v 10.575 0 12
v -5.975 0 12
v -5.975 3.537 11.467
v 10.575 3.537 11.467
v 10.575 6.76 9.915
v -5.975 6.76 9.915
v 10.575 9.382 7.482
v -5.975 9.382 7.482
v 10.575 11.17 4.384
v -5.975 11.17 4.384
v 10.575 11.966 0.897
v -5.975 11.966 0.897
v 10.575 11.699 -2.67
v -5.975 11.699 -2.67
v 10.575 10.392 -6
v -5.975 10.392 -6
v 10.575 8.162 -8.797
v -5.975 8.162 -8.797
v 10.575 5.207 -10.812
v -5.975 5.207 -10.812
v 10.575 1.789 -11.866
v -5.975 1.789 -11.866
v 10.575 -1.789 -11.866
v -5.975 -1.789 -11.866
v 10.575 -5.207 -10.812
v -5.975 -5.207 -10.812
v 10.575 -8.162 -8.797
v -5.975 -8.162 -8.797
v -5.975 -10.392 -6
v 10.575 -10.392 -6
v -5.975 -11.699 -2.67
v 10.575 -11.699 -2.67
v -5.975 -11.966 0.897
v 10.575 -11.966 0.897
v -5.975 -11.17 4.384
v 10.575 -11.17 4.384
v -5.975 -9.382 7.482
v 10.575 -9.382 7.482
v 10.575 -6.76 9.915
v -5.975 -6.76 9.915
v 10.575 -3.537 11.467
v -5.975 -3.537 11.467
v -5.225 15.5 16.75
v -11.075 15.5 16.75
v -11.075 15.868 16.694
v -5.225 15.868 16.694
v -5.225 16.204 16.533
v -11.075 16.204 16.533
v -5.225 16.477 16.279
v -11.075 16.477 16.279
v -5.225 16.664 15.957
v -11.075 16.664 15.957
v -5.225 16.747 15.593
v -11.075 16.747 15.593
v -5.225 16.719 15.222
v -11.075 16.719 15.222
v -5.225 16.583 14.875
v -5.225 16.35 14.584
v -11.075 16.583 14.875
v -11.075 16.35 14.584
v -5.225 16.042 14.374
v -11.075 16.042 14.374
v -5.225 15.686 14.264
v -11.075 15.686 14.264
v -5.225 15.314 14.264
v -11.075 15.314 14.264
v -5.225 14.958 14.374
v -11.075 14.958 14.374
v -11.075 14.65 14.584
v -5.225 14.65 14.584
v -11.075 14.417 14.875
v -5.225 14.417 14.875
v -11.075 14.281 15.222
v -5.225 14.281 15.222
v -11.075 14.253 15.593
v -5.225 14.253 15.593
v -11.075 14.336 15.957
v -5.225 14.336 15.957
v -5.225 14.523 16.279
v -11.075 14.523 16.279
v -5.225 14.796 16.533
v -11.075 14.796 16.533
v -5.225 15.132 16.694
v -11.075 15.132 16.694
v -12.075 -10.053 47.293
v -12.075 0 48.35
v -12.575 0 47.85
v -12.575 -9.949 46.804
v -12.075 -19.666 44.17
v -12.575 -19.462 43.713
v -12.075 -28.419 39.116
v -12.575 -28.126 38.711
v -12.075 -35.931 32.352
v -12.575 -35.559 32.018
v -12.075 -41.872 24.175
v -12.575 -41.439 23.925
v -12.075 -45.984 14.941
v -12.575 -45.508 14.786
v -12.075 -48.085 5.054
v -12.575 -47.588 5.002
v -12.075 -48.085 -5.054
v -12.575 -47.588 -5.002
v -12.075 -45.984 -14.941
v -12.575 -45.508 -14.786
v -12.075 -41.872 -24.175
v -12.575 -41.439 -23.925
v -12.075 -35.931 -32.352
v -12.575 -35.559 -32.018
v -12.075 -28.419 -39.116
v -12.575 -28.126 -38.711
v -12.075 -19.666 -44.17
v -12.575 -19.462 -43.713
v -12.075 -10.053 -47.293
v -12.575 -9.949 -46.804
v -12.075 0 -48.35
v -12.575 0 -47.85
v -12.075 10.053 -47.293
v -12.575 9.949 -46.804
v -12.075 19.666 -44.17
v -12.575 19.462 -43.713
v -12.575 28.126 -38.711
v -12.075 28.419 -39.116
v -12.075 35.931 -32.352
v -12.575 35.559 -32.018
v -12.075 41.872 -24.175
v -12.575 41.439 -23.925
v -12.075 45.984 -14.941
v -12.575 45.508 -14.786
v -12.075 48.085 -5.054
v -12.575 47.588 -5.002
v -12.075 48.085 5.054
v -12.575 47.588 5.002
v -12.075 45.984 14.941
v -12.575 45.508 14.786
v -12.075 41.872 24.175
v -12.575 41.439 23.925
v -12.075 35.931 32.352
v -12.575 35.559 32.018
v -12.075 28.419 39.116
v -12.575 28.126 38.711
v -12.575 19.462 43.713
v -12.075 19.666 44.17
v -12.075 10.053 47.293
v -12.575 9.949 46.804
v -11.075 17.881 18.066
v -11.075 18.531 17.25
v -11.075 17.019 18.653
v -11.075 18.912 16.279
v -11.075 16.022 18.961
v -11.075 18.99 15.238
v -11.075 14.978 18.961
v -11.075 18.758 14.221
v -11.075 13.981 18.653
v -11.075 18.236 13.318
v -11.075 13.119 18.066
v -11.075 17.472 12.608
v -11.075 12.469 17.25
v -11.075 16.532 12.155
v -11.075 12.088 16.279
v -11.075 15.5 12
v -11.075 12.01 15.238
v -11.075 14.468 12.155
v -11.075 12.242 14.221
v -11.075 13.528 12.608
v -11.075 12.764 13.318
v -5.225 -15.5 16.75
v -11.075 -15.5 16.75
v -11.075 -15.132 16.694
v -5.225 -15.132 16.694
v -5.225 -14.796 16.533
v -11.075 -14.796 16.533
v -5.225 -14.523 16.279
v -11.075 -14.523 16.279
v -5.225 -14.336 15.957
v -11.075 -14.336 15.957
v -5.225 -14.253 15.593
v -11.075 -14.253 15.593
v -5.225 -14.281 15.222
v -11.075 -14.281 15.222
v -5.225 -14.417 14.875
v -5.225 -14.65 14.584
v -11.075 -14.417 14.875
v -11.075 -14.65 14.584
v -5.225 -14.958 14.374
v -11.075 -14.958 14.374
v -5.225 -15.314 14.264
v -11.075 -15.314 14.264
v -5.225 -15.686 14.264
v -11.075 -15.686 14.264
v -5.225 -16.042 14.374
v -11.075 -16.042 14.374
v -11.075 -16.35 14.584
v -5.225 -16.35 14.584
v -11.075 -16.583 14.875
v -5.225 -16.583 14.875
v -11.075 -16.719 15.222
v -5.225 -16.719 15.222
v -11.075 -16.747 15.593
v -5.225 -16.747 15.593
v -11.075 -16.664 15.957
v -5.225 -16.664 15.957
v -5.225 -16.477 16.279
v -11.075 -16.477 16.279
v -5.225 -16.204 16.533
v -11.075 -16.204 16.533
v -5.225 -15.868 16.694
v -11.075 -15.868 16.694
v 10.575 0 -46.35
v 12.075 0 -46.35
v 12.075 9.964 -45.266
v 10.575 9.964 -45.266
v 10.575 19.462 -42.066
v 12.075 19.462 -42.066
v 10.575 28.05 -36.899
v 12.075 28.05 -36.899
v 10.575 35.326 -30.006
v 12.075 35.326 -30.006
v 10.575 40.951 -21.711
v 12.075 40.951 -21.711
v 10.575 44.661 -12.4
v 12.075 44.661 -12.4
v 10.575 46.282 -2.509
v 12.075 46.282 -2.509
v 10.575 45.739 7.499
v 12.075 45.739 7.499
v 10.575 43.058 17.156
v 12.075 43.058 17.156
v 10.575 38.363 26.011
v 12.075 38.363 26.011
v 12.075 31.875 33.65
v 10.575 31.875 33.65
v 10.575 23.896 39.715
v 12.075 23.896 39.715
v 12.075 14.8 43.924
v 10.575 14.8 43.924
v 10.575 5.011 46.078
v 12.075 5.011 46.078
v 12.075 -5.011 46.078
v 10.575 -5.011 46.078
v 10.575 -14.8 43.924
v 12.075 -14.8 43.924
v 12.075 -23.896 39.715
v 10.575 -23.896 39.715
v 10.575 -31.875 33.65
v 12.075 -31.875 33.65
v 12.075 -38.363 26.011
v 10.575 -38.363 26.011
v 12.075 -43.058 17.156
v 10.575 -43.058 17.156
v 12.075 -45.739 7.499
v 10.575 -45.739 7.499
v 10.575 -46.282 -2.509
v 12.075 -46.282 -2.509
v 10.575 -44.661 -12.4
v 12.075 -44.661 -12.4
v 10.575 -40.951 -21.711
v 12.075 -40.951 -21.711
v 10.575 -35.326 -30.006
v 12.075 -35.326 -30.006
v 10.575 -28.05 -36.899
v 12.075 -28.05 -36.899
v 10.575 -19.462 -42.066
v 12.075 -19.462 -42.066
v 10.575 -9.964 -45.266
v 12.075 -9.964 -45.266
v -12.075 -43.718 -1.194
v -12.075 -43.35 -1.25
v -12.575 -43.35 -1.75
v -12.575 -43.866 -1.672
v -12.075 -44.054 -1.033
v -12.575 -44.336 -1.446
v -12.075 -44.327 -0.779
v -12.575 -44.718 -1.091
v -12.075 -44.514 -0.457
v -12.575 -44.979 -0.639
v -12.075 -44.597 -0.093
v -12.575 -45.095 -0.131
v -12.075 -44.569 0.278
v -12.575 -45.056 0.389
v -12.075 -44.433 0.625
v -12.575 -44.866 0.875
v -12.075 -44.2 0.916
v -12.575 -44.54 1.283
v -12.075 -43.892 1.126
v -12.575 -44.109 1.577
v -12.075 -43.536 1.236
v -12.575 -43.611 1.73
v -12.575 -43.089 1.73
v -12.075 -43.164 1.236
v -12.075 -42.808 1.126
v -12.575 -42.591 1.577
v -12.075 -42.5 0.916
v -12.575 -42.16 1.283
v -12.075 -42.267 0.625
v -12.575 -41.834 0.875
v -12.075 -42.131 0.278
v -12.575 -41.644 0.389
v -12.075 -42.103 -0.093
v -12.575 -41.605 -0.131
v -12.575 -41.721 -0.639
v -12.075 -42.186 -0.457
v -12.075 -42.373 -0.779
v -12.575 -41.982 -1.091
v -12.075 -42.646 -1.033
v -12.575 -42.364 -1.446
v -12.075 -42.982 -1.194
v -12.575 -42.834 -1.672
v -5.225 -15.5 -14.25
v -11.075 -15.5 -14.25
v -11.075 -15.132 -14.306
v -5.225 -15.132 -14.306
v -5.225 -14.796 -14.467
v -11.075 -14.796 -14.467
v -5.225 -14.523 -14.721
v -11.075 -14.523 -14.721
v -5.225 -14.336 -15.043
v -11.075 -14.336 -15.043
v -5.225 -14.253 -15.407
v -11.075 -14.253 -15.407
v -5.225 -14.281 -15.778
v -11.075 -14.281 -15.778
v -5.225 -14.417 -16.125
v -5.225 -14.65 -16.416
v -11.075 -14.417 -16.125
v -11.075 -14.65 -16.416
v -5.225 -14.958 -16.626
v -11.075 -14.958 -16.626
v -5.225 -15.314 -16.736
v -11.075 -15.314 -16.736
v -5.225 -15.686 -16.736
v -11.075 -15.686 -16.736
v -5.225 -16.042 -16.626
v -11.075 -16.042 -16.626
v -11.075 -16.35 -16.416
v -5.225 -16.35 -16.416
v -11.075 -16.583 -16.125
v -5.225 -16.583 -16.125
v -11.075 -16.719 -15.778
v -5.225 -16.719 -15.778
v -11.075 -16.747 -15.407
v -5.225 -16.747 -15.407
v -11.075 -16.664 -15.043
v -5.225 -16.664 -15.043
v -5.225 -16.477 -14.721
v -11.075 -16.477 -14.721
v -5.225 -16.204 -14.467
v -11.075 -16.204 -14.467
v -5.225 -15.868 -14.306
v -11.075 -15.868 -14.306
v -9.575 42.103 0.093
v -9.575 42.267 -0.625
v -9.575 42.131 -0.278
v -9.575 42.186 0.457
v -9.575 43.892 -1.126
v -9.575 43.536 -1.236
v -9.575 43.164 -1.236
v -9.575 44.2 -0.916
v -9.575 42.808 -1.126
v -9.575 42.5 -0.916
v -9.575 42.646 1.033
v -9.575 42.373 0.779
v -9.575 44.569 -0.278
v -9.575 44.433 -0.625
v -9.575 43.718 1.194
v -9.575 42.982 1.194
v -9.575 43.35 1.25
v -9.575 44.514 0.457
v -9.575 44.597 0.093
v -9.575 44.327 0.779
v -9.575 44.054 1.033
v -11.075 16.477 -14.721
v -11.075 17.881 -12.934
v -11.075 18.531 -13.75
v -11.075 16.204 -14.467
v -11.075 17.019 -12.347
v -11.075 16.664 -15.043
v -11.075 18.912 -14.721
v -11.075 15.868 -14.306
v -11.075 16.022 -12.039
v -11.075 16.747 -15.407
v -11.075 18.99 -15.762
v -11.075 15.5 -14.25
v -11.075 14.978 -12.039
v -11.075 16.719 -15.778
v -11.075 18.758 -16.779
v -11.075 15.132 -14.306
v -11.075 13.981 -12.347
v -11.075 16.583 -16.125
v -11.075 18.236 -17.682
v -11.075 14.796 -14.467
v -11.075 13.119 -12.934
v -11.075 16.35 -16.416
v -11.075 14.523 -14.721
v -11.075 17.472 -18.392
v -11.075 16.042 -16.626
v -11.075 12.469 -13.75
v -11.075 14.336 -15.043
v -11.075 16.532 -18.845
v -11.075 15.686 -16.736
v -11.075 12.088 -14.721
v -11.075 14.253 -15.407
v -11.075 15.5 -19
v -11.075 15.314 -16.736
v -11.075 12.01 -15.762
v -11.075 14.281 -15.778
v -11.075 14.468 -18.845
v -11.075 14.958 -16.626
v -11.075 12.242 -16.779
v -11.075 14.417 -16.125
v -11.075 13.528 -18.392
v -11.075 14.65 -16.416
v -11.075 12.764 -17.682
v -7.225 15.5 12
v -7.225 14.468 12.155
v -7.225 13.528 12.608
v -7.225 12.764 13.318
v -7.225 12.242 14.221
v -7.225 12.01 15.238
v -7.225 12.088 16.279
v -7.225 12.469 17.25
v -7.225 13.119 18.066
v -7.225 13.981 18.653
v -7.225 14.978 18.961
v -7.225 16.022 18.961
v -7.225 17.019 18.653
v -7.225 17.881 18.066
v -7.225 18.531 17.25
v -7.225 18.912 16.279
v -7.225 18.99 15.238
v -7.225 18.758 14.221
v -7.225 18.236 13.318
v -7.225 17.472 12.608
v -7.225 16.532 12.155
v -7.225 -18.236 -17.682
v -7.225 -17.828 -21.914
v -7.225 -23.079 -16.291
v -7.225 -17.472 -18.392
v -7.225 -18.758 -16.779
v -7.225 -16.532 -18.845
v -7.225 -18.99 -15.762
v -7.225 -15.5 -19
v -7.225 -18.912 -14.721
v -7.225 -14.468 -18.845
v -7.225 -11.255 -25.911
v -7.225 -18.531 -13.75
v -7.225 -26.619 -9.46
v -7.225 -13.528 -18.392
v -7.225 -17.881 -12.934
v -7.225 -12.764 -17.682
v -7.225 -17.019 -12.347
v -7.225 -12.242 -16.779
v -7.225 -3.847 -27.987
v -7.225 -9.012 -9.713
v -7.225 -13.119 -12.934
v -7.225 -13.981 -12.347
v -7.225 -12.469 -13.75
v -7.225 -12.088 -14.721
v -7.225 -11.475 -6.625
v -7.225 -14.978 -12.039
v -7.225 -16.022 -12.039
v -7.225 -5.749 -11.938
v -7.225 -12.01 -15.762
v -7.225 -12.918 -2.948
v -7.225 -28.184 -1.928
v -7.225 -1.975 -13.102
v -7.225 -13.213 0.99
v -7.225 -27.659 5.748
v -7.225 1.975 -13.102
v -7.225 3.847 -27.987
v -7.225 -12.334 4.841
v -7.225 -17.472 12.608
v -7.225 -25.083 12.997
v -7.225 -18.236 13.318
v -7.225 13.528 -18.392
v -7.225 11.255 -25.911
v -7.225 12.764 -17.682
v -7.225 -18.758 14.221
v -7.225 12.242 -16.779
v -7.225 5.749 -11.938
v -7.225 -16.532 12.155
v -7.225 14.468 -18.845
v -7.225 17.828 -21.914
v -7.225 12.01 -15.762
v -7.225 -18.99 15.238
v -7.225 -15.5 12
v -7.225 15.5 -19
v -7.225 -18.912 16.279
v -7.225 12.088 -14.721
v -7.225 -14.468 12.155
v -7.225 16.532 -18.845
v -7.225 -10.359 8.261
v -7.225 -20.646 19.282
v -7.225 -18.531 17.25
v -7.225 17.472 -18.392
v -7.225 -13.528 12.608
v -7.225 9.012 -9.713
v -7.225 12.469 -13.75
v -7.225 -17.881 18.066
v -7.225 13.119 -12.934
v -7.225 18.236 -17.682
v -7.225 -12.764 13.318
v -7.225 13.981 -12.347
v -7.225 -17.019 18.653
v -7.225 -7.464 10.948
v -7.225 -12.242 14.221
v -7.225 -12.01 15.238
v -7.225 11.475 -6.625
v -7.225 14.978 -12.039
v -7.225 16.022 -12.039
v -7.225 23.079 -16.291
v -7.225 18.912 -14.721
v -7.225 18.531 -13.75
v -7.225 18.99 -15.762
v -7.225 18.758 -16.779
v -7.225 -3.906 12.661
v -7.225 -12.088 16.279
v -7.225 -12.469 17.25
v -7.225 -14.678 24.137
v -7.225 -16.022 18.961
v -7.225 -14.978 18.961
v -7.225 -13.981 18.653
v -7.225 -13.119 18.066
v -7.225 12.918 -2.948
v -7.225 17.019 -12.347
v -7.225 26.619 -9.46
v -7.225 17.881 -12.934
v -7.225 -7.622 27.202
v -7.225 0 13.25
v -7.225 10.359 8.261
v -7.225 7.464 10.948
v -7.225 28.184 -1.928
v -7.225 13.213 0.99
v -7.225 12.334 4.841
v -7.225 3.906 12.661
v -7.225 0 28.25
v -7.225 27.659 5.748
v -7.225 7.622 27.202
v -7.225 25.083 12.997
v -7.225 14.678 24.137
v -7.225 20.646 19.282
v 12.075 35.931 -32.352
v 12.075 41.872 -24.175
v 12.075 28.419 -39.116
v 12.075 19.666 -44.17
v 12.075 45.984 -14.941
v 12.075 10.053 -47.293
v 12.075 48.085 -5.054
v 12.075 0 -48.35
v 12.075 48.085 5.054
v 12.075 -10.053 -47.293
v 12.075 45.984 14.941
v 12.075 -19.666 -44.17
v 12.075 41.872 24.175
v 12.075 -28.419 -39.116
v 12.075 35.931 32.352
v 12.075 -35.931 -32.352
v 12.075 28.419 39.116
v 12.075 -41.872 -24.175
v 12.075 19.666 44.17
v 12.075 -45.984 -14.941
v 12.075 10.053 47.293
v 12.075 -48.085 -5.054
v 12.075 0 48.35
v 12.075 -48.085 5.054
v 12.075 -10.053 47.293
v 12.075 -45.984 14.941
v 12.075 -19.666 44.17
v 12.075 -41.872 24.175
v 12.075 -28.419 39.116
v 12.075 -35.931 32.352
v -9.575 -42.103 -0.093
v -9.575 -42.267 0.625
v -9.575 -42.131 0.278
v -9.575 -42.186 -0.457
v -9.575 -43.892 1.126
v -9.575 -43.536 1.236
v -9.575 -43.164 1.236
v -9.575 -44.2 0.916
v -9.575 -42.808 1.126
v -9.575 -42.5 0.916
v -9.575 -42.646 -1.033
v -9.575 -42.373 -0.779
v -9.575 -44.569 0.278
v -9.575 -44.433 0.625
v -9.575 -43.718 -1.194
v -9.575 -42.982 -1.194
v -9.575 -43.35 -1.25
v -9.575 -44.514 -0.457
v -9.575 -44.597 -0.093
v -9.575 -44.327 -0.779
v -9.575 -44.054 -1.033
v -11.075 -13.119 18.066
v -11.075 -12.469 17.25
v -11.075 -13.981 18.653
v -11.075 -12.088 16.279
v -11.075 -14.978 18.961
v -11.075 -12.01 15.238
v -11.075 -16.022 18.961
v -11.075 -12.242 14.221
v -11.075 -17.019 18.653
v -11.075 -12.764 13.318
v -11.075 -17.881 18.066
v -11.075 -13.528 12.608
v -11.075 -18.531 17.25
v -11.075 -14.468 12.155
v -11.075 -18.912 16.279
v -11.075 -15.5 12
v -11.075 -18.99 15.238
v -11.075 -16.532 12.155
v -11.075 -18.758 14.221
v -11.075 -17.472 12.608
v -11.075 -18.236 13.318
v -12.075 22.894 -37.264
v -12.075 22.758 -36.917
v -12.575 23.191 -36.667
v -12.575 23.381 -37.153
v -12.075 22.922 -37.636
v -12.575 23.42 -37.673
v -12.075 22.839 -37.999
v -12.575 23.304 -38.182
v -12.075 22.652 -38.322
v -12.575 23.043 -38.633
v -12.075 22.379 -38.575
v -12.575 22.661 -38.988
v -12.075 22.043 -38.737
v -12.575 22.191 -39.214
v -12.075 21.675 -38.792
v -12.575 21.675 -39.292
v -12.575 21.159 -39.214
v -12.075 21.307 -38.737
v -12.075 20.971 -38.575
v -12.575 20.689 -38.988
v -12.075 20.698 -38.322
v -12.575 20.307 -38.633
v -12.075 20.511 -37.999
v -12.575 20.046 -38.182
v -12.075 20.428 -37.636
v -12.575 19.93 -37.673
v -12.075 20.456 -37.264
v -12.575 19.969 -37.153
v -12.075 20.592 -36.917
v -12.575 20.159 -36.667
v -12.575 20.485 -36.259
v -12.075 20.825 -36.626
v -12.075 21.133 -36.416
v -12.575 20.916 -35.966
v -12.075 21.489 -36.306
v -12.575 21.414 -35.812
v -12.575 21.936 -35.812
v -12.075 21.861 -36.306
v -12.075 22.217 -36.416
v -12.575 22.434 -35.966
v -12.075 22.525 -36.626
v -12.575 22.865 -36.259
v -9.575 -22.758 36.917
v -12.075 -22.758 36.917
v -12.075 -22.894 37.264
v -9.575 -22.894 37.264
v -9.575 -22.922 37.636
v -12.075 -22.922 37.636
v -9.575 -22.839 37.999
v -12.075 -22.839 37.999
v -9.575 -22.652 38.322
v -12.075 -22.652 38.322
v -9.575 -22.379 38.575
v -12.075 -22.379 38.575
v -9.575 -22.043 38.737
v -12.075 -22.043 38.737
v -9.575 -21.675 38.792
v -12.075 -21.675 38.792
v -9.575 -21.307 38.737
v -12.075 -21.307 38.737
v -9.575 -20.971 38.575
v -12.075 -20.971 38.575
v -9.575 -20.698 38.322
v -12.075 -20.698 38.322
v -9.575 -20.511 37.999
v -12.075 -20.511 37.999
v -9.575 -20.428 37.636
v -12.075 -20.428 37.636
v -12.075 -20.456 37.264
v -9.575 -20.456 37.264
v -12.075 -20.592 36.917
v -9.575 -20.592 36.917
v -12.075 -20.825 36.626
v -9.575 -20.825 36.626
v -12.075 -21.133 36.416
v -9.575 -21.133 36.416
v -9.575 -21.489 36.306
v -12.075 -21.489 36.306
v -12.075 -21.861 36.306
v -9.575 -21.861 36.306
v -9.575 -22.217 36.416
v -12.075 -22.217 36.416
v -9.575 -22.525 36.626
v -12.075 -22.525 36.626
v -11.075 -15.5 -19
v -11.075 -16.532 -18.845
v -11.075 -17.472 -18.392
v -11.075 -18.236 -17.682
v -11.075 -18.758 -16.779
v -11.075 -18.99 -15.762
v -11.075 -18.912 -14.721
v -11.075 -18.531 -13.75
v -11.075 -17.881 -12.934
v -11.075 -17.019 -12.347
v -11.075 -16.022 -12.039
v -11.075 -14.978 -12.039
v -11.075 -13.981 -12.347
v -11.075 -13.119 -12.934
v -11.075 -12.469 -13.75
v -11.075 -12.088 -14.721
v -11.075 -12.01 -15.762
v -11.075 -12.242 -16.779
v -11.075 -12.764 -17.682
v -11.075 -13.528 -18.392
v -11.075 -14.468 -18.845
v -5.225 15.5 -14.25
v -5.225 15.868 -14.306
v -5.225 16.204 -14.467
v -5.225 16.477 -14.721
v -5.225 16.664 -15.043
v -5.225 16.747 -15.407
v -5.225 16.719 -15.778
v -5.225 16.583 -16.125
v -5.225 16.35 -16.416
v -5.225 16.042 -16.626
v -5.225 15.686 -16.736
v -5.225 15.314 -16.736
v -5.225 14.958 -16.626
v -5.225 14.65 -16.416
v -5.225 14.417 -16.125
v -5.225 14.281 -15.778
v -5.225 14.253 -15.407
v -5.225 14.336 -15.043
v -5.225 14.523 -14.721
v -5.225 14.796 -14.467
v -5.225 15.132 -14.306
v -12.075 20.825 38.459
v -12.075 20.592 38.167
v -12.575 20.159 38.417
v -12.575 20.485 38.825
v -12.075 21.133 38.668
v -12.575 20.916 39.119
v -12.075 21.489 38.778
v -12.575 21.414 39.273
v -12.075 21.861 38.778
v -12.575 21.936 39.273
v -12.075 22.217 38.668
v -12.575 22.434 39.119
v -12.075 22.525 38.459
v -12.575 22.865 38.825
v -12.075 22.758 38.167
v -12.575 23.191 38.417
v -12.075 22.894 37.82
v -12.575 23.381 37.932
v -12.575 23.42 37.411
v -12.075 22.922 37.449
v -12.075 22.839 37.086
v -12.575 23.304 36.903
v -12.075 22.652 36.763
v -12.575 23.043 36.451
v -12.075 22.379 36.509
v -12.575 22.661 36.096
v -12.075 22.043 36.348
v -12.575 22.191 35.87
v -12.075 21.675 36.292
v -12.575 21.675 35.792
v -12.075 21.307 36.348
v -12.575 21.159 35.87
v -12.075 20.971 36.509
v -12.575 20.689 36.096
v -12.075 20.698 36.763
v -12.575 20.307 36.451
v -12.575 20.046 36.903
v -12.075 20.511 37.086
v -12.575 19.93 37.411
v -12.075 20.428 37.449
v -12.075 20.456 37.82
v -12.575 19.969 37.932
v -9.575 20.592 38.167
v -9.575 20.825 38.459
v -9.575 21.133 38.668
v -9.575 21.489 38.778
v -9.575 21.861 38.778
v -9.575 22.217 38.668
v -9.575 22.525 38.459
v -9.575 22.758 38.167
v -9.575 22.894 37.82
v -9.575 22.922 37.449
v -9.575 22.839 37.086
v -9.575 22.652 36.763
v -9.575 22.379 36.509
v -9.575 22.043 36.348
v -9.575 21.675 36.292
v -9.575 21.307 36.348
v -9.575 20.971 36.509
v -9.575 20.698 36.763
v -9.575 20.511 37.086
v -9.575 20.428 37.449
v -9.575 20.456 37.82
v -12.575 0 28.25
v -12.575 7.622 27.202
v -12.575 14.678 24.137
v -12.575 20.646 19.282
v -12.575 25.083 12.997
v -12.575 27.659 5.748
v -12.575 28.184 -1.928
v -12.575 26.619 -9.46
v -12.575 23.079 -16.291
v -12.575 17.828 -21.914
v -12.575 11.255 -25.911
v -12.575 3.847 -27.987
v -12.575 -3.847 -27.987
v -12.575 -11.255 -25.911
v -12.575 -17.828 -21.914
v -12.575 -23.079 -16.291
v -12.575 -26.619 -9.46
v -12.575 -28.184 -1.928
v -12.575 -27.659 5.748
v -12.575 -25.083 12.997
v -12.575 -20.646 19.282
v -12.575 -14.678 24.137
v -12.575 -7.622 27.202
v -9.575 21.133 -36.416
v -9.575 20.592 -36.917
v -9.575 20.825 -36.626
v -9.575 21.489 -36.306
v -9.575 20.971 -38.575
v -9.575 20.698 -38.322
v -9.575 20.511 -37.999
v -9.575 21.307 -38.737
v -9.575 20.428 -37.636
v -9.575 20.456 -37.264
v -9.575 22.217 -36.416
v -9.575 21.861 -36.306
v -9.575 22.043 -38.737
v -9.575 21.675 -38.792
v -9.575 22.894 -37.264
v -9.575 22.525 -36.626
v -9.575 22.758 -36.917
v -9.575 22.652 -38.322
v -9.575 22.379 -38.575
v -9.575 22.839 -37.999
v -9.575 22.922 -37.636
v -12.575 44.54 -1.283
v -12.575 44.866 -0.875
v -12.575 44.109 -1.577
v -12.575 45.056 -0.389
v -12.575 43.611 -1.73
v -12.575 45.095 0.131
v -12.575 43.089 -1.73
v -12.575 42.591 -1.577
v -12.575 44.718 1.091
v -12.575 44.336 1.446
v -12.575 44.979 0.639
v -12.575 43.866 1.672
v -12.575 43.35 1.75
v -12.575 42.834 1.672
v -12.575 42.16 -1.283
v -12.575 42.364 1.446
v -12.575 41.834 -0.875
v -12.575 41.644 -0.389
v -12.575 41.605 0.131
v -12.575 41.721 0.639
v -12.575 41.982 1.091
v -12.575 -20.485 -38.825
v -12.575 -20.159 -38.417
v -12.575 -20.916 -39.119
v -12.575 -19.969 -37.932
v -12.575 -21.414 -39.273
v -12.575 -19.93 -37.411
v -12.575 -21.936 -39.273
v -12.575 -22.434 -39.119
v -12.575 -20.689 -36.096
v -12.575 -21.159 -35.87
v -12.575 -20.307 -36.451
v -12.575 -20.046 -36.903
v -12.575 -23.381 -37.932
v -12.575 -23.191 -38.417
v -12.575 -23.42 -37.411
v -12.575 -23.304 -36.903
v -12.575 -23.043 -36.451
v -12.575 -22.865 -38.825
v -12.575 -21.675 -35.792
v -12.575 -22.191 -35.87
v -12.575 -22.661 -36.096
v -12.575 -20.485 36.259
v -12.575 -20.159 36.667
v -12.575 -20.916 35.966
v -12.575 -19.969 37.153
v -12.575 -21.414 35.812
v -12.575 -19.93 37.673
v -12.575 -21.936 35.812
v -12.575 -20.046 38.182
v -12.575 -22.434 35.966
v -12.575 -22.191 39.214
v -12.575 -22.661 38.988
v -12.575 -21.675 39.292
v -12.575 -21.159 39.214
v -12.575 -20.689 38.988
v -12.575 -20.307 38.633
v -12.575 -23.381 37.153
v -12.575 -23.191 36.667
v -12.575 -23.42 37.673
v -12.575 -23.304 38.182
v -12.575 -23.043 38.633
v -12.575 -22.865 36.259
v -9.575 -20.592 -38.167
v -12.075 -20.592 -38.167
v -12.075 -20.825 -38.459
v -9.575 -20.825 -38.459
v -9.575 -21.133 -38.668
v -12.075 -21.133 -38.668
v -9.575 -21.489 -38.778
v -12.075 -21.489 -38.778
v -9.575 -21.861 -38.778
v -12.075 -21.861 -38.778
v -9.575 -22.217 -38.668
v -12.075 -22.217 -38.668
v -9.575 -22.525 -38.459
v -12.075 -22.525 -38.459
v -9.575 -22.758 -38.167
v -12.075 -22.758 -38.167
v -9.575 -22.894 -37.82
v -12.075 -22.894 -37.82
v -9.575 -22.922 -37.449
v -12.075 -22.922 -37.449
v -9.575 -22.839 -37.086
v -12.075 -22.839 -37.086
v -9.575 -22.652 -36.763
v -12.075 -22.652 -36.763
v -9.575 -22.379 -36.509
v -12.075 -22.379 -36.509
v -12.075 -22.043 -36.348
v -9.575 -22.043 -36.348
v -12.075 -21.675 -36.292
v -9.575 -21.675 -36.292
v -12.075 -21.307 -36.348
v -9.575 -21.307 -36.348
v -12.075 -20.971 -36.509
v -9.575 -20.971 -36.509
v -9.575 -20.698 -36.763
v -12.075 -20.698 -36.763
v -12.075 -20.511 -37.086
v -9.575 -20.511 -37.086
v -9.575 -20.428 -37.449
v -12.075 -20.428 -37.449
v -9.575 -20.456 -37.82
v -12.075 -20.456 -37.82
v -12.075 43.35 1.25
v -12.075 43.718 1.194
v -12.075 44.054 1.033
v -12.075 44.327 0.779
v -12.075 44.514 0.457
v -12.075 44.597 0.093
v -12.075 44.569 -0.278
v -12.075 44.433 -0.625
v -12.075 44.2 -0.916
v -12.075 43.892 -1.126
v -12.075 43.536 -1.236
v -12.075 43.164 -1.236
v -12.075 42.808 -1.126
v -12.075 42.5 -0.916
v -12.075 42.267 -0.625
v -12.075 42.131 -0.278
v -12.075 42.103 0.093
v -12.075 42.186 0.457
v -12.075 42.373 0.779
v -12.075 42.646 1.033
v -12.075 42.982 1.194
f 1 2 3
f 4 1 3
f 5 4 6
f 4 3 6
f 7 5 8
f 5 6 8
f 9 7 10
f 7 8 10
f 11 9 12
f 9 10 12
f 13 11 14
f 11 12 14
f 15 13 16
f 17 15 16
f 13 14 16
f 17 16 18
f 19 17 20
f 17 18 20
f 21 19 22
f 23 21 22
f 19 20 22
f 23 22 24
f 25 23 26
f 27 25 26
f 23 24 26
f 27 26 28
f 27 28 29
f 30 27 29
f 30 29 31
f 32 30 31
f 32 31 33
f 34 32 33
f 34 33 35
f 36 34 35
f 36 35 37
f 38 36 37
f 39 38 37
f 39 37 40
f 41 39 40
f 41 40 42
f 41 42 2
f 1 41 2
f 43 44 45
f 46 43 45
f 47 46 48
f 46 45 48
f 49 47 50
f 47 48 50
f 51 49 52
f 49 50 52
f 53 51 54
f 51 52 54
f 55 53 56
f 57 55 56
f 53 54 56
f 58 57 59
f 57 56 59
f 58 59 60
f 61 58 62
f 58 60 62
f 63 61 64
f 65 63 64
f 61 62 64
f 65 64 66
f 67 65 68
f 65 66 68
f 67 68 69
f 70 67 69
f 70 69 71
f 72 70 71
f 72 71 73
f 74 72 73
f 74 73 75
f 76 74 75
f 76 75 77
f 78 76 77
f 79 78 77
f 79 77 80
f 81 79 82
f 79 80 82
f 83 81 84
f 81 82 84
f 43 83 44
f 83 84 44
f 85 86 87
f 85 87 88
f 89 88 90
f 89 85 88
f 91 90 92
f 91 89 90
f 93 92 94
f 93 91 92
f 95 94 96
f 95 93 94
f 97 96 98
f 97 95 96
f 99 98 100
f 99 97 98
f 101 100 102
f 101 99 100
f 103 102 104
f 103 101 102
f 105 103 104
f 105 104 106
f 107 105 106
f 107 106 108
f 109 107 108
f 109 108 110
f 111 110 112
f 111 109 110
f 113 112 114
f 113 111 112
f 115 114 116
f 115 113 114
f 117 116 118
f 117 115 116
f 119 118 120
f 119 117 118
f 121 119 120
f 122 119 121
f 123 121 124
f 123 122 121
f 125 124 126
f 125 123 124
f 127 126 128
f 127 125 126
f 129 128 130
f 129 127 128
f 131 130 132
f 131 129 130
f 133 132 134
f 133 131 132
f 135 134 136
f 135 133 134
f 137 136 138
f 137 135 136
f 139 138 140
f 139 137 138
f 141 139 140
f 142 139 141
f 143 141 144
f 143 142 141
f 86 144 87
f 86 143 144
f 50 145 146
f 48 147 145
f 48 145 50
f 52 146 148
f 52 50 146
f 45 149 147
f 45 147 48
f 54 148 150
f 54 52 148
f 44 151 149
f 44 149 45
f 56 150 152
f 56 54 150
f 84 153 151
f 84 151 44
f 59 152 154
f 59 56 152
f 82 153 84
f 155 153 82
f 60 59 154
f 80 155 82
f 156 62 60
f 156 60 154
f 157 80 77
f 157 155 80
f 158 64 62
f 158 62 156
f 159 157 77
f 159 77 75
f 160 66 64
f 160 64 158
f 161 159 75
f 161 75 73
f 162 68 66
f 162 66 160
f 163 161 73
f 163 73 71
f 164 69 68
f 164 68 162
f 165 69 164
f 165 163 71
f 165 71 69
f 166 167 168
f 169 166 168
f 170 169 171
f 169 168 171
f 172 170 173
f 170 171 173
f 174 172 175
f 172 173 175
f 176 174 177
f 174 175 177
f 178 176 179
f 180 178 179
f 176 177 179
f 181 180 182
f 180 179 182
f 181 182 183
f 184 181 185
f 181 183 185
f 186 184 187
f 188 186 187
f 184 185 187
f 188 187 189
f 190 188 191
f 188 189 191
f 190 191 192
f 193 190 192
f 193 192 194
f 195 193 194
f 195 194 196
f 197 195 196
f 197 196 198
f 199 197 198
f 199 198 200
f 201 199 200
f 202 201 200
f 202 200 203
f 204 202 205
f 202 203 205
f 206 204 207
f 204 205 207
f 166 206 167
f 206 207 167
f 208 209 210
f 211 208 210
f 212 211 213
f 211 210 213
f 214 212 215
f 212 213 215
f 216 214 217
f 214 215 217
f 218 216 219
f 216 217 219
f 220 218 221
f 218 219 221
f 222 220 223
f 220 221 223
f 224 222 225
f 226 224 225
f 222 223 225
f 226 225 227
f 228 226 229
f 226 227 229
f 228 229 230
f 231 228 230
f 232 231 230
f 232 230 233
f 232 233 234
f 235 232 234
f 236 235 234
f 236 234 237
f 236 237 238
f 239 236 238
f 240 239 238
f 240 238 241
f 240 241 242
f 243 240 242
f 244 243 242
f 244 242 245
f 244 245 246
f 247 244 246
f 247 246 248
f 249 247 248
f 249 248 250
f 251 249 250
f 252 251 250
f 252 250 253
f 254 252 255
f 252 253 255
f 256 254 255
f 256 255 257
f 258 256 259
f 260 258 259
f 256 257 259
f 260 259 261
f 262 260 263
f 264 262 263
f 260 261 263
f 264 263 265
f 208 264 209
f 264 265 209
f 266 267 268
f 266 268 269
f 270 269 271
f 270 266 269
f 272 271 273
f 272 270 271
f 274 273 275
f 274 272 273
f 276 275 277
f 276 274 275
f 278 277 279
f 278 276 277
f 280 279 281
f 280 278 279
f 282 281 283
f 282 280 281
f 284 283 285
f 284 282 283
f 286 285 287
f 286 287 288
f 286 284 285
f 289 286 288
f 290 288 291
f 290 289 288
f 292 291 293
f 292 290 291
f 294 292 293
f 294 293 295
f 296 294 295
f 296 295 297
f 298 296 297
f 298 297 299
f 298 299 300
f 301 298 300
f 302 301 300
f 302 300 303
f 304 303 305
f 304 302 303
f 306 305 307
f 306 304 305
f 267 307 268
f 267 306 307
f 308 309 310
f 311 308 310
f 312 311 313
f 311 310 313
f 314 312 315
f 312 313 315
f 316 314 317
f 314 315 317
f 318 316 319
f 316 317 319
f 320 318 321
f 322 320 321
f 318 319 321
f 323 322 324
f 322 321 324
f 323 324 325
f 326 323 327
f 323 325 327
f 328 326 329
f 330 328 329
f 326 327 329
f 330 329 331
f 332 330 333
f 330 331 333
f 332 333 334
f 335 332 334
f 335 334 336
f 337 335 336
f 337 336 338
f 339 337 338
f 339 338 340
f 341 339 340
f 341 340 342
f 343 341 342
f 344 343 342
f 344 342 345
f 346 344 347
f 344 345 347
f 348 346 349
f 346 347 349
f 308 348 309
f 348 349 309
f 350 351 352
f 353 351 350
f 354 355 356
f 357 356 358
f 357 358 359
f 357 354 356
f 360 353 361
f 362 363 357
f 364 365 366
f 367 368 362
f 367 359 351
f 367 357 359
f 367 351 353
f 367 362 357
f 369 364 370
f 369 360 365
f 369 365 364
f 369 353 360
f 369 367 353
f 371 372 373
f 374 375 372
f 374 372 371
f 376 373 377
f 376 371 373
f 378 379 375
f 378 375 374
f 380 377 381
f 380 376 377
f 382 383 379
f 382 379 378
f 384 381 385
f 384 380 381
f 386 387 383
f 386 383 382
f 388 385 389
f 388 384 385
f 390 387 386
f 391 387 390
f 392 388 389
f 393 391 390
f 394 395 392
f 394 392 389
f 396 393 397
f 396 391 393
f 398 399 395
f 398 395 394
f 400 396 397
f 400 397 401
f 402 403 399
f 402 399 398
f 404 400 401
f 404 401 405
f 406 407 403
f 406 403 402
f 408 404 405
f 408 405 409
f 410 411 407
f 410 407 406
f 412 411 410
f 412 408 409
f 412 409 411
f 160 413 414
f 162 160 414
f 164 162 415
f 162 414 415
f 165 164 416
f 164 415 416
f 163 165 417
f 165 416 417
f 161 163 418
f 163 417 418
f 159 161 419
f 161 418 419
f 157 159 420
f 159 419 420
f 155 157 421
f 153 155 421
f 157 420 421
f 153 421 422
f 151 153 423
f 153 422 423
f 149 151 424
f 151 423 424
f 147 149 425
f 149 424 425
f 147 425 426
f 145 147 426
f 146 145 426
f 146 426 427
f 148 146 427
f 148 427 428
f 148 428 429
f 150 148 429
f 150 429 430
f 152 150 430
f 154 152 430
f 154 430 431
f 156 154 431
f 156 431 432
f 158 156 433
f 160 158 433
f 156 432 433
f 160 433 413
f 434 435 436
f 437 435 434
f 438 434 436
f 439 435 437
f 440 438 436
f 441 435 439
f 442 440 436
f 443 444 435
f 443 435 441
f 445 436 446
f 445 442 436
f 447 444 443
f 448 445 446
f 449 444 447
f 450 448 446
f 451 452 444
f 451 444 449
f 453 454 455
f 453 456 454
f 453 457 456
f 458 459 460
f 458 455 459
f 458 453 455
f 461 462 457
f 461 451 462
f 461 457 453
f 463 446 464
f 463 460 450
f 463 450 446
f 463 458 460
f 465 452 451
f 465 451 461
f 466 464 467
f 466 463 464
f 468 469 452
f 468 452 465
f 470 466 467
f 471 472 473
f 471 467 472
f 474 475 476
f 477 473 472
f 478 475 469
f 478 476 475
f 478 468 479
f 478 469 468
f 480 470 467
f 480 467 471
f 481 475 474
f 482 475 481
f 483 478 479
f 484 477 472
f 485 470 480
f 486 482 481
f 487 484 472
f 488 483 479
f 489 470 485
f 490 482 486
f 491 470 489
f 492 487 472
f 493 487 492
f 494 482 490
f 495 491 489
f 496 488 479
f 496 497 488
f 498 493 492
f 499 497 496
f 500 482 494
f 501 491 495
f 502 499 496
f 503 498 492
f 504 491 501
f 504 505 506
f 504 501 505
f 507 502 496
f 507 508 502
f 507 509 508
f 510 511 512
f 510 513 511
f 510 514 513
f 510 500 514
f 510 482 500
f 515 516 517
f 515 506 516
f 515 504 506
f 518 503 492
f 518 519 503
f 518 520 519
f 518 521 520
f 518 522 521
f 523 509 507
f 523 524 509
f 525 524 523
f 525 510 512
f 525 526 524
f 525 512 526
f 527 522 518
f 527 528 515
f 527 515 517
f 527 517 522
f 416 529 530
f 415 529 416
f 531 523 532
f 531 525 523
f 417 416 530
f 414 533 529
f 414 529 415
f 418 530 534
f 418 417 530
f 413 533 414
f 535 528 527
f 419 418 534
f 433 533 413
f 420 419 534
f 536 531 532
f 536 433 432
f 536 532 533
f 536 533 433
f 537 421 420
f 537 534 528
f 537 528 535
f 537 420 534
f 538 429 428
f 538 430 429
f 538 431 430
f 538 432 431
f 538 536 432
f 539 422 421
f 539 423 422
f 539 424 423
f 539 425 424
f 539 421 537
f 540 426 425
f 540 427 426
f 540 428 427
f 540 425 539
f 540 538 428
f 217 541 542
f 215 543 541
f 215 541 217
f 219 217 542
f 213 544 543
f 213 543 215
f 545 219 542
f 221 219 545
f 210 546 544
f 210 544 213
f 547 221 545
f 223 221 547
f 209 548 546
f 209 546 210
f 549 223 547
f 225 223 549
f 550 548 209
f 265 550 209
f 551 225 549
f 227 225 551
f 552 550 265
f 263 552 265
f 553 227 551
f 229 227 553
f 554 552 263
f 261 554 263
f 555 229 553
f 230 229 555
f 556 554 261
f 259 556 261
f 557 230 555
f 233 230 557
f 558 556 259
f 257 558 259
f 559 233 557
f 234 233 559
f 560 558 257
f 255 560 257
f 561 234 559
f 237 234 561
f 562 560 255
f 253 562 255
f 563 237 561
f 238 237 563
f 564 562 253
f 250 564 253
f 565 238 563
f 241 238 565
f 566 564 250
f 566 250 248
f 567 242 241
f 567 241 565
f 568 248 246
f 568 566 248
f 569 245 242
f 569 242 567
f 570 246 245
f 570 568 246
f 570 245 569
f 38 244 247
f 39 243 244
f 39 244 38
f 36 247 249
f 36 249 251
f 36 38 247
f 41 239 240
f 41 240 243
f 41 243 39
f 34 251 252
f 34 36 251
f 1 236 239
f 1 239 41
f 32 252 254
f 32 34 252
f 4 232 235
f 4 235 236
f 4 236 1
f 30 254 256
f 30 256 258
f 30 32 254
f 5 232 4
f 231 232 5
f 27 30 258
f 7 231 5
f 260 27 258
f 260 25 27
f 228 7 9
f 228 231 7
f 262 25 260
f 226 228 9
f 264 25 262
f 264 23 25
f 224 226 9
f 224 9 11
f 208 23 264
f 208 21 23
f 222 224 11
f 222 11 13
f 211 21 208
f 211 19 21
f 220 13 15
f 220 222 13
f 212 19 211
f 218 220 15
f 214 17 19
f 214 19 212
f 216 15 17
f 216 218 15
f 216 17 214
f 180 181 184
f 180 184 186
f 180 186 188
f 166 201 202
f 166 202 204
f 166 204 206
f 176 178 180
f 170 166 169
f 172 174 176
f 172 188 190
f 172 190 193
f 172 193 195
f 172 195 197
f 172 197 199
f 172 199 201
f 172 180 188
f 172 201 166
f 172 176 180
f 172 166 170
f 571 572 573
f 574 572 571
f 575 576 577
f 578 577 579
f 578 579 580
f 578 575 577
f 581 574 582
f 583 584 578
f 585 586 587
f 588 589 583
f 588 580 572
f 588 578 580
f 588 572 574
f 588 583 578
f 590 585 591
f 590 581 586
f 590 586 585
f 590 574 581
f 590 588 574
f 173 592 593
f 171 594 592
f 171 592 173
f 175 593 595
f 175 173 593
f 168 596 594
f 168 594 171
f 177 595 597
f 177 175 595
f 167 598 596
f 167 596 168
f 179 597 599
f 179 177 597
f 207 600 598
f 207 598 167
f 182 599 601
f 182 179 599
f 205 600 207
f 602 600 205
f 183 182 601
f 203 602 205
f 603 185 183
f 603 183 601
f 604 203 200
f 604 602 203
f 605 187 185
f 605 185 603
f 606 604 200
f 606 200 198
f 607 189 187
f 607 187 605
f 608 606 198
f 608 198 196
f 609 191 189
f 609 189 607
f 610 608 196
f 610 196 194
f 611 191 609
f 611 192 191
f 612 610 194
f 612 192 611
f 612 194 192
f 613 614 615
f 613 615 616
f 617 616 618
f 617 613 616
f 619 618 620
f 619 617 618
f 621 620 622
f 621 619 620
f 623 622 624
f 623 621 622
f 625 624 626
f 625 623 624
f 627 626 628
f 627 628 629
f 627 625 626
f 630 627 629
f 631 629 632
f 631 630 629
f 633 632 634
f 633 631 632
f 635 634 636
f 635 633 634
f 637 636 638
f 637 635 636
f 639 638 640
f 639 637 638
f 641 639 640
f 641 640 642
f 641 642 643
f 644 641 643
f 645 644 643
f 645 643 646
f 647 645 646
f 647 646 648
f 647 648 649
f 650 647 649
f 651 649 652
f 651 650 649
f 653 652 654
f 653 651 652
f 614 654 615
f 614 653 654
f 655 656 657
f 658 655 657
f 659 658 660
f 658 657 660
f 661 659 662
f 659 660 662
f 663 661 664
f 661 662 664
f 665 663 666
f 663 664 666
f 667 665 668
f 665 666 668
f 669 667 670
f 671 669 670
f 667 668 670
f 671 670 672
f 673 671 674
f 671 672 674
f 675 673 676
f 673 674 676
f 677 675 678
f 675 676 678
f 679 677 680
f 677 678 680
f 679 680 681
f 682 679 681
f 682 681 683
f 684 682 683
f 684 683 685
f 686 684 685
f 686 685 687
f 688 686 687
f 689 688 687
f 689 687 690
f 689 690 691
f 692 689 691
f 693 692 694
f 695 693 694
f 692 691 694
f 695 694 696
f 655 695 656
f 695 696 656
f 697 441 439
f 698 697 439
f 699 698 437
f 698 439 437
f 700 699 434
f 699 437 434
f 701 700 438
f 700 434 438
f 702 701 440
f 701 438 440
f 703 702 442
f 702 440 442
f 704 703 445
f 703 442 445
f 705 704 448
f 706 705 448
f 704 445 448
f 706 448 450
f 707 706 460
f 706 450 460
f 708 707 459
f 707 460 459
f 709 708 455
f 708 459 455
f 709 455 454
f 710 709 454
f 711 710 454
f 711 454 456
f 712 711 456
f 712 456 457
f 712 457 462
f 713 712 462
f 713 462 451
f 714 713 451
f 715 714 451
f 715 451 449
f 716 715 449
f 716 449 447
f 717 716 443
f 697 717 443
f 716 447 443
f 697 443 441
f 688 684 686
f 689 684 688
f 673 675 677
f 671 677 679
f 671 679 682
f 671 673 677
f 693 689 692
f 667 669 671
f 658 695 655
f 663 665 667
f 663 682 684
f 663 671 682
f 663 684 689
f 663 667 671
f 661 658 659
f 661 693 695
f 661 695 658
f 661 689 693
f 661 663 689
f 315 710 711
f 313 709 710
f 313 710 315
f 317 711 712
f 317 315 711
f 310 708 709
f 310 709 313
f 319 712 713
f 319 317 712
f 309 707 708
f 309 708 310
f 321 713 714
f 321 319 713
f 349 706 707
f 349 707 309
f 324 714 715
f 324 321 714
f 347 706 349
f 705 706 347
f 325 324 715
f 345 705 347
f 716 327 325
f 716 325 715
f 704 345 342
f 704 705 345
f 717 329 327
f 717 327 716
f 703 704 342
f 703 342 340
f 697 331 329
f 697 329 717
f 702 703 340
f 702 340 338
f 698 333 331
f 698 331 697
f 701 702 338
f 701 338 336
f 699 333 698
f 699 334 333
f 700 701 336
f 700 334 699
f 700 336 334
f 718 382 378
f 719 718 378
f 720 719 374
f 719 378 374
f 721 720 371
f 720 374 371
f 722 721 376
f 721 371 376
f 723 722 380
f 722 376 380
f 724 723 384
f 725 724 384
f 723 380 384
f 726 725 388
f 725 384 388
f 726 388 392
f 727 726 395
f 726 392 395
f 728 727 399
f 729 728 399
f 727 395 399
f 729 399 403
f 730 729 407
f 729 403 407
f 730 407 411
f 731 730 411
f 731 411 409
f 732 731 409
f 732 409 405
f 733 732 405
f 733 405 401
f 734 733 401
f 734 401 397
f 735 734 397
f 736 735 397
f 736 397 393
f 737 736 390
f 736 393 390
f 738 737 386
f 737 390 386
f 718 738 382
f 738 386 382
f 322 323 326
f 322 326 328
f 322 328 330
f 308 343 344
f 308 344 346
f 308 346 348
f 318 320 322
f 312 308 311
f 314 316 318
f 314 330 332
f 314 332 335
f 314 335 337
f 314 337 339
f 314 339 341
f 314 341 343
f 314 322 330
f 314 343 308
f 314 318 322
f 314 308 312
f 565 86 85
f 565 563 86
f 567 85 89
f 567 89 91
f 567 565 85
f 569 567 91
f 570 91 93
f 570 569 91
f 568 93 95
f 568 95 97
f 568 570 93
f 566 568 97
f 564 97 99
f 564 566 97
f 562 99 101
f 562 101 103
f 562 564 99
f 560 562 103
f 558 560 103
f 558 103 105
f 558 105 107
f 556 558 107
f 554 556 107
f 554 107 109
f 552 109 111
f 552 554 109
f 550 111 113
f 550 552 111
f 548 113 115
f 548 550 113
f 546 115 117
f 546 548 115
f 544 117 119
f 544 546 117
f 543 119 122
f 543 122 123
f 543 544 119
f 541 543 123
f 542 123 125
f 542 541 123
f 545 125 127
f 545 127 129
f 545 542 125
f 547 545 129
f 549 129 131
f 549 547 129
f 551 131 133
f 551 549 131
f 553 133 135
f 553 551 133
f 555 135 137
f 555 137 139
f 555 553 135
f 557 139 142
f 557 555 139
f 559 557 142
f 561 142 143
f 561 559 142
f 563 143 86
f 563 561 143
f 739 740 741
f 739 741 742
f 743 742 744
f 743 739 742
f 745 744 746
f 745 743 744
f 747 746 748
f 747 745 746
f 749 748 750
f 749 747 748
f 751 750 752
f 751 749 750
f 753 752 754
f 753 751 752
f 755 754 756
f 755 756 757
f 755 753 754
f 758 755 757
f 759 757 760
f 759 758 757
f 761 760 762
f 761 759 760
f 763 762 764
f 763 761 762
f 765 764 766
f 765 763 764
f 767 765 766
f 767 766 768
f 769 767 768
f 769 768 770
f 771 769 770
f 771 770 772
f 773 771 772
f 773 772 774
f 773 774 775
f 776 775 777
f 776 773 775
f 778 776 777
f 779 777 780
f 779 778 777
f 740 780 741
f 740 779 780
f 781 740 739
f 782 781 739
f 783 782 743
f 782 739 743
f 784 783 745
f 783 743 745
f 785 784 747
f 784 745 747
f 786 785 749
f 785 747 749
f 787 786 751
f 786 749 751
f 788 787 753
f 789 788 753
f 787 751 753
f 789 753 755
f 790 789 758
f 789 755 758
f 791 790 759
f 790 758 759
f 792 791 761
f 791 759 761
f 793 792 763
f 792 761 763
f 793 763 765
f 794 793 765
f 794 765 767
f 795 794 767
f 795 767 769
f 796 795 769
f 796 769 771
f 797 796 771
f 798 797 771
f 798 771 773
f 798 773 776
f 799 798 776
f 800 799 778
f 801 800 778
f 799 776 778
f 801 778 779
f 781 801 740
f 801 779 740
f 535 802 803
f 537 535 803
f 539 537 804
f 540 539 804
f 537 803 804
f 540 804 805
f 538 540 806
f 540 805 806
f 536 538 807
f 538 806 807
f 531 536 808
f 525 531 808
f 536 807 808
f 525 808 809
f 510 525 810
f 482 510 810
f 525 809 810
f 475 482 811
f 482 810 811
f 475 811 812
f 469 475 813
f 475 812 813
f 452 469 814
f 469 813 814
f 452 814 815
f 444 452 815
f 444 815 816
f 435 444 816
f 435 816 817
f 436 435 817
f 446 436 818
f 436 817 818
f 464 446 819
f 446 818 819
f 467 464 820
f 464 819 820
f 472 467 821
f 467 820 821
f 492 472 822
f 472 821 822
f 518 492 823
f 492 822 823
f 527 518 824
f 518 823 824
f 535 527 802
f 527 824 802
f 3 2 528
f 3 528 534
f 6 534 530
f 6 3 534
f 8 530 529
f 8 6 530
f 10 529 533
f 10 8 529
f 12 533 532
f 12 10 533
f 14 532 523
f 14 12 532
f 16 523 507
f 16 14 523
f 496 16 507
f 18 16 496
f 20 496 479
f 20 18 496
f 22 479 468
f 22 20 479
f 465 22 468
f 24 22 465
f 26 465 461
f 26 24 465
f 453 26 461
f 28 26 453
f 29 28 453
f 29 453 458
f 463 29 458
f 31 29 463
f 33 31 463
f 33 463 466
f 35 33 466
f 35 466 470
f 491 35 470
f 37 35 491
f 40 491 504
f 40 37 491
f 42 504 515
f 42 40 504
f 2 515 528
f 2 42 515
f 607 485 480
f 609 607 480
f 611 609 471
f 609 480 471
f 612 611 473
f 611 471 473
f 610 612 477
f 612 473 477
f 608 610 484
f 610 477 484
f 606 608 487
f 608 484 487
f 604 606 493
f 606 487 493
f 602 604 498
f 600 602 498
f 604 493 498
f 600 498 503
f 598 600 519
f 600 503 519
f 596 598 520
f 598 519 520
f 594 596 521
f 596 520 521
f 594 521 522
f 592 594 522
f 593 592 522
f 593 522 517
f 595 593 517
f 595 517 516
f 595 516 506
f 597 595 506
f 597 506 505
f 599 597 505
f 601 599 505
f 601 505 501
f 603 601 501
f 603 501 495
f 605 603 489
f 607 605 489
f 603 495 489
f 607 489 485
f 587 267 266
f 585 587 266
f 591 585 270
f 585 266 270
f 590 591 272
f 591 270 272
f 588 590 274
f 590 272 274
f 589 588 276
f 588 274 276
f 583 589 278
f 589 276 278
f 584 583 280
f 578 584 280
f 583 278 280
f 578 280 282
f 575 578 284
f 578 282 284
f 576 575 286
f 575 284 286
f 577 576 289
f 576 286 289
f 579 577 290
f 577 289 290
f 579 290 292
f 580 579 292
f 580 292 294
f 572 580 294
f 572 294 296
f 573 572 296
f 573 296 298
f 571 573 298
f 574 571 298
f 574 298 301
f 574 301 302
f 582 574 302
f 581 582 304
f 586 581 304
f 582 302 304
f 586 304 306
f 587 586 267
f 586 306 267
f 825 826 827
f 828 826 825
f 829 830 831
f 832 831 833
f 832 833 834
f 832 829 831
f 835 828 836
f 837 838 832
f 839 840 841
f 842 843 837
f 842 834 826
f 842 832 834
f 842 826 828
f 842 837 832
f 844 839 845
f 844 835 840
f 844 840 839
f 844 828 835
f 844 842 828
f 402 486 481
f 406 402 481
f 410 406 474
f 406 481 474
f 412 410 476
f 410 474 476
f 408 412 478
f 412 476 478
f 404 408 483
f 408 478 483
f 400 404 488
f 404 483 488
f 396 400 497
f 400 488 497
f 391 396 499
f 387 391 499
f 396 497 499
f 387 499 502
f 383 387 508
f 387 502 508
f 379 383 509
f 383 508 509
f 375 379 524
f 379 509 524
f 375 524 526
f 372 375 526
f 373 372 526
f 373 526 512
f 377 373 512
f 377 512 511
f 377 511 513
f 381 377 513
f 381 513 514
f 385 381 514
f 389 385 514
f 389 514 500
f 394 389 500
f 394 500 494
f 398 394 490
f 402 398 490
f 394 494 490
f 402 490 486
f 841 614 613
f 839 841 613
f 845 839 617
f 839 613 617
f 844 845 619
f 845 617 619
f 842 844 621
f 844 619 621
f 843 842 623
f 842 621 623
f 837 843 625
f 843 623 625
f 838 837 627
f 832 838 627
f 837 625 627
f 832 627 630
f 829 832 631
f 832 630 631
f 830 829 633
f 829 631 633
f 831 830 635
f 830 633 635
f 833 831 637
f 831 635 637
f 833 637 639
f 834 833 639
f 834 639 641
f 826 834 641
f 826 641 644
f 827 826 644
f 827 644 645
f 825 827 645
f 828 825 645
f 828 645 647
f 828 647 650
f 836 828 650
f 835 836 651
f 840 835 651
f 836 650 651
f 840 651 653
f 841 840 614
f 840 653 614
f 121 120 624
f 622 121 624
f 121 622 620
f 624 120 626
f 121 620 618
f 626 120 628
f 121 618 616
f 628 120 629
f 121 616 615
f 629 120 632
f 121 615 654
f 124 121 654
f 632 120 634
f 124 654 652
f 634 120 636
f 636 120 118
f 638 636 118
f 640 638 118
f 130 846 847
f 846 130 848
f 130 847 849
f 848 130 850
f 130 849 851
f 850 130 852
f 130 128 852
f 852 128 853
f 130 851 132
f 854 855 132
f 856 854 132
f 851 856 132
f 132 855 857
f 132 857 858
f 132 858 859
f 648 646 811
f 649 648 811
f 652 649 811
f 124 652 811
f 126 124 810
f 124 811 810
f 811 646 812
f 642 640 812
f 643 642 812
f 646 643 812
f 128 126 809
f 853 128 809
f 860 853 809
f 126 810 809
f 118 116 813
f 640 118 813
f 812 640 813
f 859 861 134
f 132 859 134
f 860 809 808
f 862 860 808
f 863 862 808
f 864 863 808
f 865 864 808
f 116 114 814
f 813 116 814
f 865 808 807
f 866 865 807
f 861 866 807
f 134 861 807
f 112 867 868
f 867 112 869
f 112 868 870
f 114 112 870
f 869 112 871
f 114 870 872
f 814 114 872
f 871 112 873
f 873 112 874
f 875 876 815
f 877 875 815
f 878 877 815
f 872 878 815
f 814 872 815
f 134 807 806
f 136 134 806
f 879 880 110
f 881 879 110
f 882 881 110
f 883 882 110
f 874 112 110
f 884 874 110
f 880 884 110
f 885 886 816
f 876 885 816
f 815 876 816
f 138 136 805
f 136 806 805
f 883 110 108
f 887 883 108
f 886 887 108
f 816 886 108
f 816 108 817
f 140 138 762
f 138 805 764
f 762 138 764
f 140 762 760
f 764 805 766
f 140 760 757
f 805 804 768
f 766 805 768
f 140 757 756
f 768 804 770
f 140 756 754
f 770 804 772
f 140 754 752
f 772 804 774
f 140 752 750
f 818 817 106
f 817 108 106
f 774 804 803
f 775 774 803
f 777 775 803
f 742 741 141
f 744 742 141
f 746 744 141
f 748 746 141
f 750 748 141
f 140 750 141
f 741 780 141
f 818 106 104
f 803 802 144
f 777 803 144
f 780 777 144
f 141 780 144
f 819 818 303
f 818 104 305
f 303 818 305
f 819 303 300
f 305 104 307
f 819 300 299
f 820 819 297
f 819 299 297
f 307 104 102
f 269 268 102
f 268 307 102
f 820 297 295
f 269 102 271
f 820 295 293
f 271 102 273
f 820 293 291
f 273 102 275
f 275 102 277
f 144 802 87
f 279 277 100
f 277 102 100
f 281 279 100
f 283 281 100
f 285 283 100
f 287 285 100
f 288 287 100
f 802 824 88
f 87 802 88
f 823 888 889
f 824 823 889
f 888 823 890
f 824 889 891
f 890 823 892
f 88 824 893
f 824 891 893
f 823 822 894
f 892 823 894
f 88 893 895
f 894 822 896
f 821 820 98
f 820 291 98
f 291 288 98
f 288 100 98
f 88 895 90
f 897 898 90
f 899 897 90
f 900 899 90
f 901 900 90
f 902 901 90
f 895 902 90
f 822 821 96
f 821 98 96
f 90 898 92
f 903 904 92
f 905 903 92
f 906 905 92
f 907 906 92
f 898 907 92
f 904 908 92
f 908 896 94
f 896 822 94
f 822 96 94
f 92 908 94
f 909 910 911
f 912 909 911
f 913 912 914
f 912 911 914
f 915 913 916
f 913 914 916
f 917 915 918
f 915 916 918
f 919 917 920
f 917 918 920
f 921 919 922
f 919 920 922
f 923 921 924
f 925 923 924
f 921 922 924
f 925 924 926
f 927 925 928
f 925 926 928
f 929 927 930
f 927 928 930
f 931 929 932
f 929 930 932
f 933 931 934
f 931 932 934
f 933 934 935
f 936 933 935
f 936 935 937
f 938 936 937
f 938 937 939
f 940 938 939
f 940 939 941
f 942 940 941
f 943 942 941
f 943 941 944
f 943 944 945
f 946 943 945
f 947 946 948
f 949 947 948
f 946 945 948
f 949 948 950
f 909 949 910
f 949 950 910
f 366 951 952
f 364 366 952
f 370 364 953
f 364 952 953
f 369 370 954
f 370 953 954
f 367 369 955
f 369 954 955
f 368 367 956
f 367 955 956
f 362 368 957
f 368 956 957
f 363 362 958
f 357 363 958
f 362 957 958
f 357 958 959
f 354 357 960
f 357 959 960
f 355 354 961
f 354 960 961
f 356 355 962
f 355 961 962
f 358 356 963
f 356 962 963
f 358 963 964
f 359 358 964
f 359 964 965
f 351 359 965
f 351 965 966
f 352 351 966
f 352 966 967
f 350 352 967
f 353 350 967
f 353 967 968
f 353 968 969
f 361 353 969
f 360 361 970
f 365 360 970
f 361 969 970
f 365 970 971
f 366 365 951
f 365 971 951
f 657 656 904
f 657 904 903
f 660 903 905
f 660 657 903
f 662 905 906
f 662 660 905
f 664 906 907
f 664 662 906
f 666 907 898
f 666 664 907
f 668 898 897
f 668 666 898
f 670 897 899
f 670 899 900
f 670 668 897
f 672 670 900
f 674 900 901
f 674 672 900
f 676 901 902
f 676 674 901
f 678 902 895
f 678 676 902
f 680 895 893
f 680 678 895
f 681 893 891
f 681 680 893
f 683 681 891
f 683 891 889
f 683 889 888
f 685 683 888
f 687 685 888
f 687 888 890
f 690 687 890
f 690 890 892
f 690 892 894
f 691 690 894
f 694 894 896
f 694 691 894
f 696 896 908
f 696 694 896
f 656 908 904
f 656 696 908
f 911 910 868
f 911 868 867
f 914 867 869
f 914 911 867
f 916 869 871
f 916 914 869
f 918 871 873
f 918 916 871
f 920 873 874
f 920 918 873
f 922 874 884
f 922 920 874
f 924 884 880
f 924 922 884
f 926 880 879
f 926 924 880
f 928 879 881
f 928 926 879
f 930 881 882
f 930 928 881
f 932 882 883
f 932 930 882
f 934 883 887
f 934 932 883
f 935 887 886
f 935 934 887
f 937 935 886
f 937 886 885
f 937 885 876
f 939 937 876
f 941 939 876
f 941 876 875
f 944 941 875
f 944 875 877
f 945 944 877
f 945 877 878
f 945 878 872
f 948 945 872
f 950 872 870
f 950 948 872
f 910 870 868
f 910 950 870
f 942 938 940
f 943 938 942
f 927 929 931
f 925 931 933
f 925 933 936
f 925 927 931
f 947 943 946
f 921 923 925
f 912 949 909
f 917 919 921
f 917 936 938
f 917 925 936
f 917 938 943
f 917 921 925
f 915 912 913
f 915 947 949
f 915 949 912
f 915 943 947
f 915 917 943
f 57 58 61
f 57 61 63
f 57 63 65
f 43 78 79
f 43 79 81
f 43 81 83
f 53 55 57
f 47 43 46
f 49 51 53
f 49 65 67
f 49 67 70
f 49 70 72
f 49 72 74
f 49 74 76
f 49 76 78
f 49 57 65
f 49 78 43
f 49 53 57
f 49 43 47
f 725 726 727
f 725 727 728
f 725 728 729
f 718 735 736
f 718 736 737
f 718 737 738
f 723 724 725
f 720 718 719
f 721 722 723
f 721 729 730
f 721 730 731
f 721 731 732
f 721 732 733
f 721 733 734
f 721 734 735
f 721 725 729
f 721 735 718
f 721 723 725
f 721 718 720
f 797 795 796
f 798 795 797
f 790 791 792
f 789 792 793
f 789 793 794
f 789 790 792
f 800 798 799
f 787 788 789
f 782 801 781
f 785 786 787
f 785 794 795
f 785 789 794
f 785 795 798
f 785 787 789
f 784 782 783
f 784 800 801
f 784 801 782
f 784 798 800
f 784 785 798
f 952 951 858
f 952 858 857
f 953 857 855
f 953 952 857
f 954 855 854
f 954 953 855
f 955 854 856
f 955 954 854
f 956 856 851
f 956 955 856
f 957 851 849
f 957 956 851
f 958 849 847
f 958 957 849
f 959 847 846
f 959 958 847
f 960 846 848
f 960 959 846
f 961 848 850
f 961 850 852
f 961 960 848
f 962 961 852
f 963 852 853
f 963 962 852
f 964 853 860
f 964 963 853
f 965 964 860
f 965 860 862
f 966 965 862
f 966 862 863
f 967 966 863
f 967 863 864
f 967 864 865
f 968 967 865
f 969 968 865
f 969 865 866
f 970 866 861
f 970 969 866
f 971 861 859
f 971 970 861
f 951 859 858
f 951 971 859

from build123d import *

# Parameters (mm, degrees)
SKETCH1_R                    = 48.35
BOSS_EXTRUDE1_DEPTH          = 12.575
SKETCH2_R                    = 1.25
CUT_EXTRUDE1_DEPTH           = 3
CHAMFER1_SIZE                = 0.5
CIRPATTERN1_COUNT            = 6
CHAMFER1_OF_CIRPATTERN1_SIZE = 0.5
SKETCH3_R                    = 12
CUT_EXTRUDE2_DEPTH           = 25.15
CHAMFER2_SIZE                = 1.25
CHAMFER3_SIZE                = 0.5
SKETCH4_R                    = 28.25
CUT_EXTRUDE3_DEPTH           = 5.35
SKETCH5_R                    = 3.5
BOSS_EXTRUDE2_DEPTH          = 3.85
SKETCH6_R                    = 1.25
CUT_EXTRUDE4_DEPTH           = 5.85
SKETCH7_R                    = 46.35
CUT_EXTRUDE5_DEPTH           = 2
SKETCH8_R                    = 48.35
SKETCH8_R_2                  = 46.35
CUT_EXTRUDE6_DEPTH           = 0.5
CHAMFER4_SIZE                = 1.25


with BuildPart() as part:
    # Sketch1 → Boss-Extrude1 (new, symmetric)
    with BuildSketch(Plane(origin=(0, 0, 0), x_dir=(0, 0, -1), z_dir=(1, 0, 0))):
        with Locations(Location((0, 0, 0), (0, 0, 180))):
            Circle(SKETCH1_R)
    extrude(amount=BOSS_EXTRUDE1_DEPTH, both=True)

    # Sketch2 → Cut-Extrude1 (cut)
    with BuildSketch(Plane.ZY.offset(12.575)):
        with Locations((0, 43.35)):
            Circle(SKETCH2_R)
    cut_extrude1 = extrude(amount=-CUT_EXTRUDE1_DEPTH, mode=Mode.SUBTRACT)

    # Chamfer1
    chamfer1_edges = [part.edges().sort_by_distance(p)[0] for p in [
        (-12.575, 43.35, -1.25),
    ]]
    chamfer(chamfer1_edges, length=CHAMFER1_SIZE)

    # CirPattern1: Cut-Extrude1 ×6 about axis
    cirpattern1_axis = Axis((0, 0, 0), (1, 0, 0))
    for i in range(1, CIRPATTERN1_COUNT):
        add(cut_extrude1.rotate(cirpattern1_axis, i * 360 / CIRPATTERN1_COUNT), mode=Mode.SUBTRACT)

    # Chamfer1 of CirPattern1
    chamfer1_of_cirpattern1_edges = [part.edges().sort_by_distance(p)[0] for p in [
        (-12.575, 22.757531755, 36.917201254),
        (-12.575, -20.592468245, 38.167201254),
        (-12.575, -43.35, 1.25),
        (-12.575, -22.757531755, -36.917201254),
        (-12.575, 20.592468245, -38.167201254),
    ]]
    chamfer(chamfer1_of_cirpattern1_edges, length=CHAMFER1_OF_CIRPATTERN1_SIZE)

    # Sketch3 → Cut-Extrude2 (cut)
    with BuildSketch(Plane.ZY.offset(12.575)):
        Circle(SKETCH3_R)
    extrude(amount=-CUT_EXTRUDE2_DEPTH, mode=Mode.SUBTRACT)

    # Chamfer2
    chamfer2_edges = [part.edges().sort_by_distance(p)[0] for p in [
        (-12.575, 0, -12),
    ]]
    chamfer(chamfer2_edges, length=CHAMFER2_SIZE)

    # Chamfer3
    chamfer3_edges = [part.edges().sort_by_distance(p)[0] for p in [
        (-12.575, 0, -48.35),
    ]]
    chamfer(chamfer3_edges, length=CHAMFER3_SIZE)

    # Sketch4 → Cut-Extrude3 (cut)
    with BuildSketch(Plane.ZY.offset(12.575)):
        Circle(SKETCH4_R)
    extrude(amount=-CUT_EXTRUDE3_DEPTH, mode=Mode.SUBTRACT)

    # Sketch5 → Boss-Extrude2 (add)
    with BuildSketch(Plane.ZY.offset(7.225)):
        with Locations(Location((-15.5, 15.5, 0), (0, 0, 180))):
            Circle(SKETCH5_R)
        with Locations(Location((15.5, 15.5, 0), (0, 0, 180))):
            Circle(SKETCH5_R)
        with Locations(Location((15.5, -15.5, 0), (0, 0, 180))):
            Circle(SKETCH5_R)
        with Locations(Location((-15.5, -15.5, 0), (0, 0, 180))):
            Circle(SKETCH5_R)
    extrude(amount=BOSS_EXTRUDE2_DEPTH)

    # Sketch6 → Cut-Extrude4 (cut)
    with BuildSketch(Plane.ZY.offset(11.075)):
        with Locations((-15.5, 15.5)):
            Circle(SKETCH6_R)
        with Locations((15.5, 15.5)):
            Circle(SKETCH6_R)
        with Locations((15.5, -15.5)):
            Circle(SKETCH6_R)
        with Locations((-15.5, -15.5)):
            Circle(SKETCH6_R)
    extrude(amount=-CUT_EXTRUDE4_DEPTH, mode=Mode.SUBTRACT)

    # Sketch7 → Cut-Extrude5 (cut)
    with BuildSketch(Plane(origin=(12.575, 0, 0), x_dir=(0, 0, -1), z_dir=(1, 0, 0))):
        Circle(SKETCH7_R)
    extrude(amount=-CUT_EXTRUDE5_DEPTH, mode=Mode.SUBTRACT)

    # Sketch8 → Cut-Extrude6 (cut)
    with BuildSketch(Plane(origin=(12.575, 0, 0), x_dir=(0, 0, -1), z_dir=(1, 0, 0))):
        with Locations(Location((0, 0, 0), (0, 0, 180))):
            Circle(SKETCH8_R)
        Circle(SKETCH8_R_2, mode=Mode.SUBTRACT)
    extrude(amount=-CUT_EXTRUDE6_DEPTH, mode=Mode.SUBTRACT)

    # Chamfer4
    chamfer4_edges = [part.edges().sort_by_distance(p)[0] for p in [
        (-7.225, 0, -12),
    ]]
    chamfer(chamfer4_edges, length=CHAMFER4_SIZE)


solid = part.part
